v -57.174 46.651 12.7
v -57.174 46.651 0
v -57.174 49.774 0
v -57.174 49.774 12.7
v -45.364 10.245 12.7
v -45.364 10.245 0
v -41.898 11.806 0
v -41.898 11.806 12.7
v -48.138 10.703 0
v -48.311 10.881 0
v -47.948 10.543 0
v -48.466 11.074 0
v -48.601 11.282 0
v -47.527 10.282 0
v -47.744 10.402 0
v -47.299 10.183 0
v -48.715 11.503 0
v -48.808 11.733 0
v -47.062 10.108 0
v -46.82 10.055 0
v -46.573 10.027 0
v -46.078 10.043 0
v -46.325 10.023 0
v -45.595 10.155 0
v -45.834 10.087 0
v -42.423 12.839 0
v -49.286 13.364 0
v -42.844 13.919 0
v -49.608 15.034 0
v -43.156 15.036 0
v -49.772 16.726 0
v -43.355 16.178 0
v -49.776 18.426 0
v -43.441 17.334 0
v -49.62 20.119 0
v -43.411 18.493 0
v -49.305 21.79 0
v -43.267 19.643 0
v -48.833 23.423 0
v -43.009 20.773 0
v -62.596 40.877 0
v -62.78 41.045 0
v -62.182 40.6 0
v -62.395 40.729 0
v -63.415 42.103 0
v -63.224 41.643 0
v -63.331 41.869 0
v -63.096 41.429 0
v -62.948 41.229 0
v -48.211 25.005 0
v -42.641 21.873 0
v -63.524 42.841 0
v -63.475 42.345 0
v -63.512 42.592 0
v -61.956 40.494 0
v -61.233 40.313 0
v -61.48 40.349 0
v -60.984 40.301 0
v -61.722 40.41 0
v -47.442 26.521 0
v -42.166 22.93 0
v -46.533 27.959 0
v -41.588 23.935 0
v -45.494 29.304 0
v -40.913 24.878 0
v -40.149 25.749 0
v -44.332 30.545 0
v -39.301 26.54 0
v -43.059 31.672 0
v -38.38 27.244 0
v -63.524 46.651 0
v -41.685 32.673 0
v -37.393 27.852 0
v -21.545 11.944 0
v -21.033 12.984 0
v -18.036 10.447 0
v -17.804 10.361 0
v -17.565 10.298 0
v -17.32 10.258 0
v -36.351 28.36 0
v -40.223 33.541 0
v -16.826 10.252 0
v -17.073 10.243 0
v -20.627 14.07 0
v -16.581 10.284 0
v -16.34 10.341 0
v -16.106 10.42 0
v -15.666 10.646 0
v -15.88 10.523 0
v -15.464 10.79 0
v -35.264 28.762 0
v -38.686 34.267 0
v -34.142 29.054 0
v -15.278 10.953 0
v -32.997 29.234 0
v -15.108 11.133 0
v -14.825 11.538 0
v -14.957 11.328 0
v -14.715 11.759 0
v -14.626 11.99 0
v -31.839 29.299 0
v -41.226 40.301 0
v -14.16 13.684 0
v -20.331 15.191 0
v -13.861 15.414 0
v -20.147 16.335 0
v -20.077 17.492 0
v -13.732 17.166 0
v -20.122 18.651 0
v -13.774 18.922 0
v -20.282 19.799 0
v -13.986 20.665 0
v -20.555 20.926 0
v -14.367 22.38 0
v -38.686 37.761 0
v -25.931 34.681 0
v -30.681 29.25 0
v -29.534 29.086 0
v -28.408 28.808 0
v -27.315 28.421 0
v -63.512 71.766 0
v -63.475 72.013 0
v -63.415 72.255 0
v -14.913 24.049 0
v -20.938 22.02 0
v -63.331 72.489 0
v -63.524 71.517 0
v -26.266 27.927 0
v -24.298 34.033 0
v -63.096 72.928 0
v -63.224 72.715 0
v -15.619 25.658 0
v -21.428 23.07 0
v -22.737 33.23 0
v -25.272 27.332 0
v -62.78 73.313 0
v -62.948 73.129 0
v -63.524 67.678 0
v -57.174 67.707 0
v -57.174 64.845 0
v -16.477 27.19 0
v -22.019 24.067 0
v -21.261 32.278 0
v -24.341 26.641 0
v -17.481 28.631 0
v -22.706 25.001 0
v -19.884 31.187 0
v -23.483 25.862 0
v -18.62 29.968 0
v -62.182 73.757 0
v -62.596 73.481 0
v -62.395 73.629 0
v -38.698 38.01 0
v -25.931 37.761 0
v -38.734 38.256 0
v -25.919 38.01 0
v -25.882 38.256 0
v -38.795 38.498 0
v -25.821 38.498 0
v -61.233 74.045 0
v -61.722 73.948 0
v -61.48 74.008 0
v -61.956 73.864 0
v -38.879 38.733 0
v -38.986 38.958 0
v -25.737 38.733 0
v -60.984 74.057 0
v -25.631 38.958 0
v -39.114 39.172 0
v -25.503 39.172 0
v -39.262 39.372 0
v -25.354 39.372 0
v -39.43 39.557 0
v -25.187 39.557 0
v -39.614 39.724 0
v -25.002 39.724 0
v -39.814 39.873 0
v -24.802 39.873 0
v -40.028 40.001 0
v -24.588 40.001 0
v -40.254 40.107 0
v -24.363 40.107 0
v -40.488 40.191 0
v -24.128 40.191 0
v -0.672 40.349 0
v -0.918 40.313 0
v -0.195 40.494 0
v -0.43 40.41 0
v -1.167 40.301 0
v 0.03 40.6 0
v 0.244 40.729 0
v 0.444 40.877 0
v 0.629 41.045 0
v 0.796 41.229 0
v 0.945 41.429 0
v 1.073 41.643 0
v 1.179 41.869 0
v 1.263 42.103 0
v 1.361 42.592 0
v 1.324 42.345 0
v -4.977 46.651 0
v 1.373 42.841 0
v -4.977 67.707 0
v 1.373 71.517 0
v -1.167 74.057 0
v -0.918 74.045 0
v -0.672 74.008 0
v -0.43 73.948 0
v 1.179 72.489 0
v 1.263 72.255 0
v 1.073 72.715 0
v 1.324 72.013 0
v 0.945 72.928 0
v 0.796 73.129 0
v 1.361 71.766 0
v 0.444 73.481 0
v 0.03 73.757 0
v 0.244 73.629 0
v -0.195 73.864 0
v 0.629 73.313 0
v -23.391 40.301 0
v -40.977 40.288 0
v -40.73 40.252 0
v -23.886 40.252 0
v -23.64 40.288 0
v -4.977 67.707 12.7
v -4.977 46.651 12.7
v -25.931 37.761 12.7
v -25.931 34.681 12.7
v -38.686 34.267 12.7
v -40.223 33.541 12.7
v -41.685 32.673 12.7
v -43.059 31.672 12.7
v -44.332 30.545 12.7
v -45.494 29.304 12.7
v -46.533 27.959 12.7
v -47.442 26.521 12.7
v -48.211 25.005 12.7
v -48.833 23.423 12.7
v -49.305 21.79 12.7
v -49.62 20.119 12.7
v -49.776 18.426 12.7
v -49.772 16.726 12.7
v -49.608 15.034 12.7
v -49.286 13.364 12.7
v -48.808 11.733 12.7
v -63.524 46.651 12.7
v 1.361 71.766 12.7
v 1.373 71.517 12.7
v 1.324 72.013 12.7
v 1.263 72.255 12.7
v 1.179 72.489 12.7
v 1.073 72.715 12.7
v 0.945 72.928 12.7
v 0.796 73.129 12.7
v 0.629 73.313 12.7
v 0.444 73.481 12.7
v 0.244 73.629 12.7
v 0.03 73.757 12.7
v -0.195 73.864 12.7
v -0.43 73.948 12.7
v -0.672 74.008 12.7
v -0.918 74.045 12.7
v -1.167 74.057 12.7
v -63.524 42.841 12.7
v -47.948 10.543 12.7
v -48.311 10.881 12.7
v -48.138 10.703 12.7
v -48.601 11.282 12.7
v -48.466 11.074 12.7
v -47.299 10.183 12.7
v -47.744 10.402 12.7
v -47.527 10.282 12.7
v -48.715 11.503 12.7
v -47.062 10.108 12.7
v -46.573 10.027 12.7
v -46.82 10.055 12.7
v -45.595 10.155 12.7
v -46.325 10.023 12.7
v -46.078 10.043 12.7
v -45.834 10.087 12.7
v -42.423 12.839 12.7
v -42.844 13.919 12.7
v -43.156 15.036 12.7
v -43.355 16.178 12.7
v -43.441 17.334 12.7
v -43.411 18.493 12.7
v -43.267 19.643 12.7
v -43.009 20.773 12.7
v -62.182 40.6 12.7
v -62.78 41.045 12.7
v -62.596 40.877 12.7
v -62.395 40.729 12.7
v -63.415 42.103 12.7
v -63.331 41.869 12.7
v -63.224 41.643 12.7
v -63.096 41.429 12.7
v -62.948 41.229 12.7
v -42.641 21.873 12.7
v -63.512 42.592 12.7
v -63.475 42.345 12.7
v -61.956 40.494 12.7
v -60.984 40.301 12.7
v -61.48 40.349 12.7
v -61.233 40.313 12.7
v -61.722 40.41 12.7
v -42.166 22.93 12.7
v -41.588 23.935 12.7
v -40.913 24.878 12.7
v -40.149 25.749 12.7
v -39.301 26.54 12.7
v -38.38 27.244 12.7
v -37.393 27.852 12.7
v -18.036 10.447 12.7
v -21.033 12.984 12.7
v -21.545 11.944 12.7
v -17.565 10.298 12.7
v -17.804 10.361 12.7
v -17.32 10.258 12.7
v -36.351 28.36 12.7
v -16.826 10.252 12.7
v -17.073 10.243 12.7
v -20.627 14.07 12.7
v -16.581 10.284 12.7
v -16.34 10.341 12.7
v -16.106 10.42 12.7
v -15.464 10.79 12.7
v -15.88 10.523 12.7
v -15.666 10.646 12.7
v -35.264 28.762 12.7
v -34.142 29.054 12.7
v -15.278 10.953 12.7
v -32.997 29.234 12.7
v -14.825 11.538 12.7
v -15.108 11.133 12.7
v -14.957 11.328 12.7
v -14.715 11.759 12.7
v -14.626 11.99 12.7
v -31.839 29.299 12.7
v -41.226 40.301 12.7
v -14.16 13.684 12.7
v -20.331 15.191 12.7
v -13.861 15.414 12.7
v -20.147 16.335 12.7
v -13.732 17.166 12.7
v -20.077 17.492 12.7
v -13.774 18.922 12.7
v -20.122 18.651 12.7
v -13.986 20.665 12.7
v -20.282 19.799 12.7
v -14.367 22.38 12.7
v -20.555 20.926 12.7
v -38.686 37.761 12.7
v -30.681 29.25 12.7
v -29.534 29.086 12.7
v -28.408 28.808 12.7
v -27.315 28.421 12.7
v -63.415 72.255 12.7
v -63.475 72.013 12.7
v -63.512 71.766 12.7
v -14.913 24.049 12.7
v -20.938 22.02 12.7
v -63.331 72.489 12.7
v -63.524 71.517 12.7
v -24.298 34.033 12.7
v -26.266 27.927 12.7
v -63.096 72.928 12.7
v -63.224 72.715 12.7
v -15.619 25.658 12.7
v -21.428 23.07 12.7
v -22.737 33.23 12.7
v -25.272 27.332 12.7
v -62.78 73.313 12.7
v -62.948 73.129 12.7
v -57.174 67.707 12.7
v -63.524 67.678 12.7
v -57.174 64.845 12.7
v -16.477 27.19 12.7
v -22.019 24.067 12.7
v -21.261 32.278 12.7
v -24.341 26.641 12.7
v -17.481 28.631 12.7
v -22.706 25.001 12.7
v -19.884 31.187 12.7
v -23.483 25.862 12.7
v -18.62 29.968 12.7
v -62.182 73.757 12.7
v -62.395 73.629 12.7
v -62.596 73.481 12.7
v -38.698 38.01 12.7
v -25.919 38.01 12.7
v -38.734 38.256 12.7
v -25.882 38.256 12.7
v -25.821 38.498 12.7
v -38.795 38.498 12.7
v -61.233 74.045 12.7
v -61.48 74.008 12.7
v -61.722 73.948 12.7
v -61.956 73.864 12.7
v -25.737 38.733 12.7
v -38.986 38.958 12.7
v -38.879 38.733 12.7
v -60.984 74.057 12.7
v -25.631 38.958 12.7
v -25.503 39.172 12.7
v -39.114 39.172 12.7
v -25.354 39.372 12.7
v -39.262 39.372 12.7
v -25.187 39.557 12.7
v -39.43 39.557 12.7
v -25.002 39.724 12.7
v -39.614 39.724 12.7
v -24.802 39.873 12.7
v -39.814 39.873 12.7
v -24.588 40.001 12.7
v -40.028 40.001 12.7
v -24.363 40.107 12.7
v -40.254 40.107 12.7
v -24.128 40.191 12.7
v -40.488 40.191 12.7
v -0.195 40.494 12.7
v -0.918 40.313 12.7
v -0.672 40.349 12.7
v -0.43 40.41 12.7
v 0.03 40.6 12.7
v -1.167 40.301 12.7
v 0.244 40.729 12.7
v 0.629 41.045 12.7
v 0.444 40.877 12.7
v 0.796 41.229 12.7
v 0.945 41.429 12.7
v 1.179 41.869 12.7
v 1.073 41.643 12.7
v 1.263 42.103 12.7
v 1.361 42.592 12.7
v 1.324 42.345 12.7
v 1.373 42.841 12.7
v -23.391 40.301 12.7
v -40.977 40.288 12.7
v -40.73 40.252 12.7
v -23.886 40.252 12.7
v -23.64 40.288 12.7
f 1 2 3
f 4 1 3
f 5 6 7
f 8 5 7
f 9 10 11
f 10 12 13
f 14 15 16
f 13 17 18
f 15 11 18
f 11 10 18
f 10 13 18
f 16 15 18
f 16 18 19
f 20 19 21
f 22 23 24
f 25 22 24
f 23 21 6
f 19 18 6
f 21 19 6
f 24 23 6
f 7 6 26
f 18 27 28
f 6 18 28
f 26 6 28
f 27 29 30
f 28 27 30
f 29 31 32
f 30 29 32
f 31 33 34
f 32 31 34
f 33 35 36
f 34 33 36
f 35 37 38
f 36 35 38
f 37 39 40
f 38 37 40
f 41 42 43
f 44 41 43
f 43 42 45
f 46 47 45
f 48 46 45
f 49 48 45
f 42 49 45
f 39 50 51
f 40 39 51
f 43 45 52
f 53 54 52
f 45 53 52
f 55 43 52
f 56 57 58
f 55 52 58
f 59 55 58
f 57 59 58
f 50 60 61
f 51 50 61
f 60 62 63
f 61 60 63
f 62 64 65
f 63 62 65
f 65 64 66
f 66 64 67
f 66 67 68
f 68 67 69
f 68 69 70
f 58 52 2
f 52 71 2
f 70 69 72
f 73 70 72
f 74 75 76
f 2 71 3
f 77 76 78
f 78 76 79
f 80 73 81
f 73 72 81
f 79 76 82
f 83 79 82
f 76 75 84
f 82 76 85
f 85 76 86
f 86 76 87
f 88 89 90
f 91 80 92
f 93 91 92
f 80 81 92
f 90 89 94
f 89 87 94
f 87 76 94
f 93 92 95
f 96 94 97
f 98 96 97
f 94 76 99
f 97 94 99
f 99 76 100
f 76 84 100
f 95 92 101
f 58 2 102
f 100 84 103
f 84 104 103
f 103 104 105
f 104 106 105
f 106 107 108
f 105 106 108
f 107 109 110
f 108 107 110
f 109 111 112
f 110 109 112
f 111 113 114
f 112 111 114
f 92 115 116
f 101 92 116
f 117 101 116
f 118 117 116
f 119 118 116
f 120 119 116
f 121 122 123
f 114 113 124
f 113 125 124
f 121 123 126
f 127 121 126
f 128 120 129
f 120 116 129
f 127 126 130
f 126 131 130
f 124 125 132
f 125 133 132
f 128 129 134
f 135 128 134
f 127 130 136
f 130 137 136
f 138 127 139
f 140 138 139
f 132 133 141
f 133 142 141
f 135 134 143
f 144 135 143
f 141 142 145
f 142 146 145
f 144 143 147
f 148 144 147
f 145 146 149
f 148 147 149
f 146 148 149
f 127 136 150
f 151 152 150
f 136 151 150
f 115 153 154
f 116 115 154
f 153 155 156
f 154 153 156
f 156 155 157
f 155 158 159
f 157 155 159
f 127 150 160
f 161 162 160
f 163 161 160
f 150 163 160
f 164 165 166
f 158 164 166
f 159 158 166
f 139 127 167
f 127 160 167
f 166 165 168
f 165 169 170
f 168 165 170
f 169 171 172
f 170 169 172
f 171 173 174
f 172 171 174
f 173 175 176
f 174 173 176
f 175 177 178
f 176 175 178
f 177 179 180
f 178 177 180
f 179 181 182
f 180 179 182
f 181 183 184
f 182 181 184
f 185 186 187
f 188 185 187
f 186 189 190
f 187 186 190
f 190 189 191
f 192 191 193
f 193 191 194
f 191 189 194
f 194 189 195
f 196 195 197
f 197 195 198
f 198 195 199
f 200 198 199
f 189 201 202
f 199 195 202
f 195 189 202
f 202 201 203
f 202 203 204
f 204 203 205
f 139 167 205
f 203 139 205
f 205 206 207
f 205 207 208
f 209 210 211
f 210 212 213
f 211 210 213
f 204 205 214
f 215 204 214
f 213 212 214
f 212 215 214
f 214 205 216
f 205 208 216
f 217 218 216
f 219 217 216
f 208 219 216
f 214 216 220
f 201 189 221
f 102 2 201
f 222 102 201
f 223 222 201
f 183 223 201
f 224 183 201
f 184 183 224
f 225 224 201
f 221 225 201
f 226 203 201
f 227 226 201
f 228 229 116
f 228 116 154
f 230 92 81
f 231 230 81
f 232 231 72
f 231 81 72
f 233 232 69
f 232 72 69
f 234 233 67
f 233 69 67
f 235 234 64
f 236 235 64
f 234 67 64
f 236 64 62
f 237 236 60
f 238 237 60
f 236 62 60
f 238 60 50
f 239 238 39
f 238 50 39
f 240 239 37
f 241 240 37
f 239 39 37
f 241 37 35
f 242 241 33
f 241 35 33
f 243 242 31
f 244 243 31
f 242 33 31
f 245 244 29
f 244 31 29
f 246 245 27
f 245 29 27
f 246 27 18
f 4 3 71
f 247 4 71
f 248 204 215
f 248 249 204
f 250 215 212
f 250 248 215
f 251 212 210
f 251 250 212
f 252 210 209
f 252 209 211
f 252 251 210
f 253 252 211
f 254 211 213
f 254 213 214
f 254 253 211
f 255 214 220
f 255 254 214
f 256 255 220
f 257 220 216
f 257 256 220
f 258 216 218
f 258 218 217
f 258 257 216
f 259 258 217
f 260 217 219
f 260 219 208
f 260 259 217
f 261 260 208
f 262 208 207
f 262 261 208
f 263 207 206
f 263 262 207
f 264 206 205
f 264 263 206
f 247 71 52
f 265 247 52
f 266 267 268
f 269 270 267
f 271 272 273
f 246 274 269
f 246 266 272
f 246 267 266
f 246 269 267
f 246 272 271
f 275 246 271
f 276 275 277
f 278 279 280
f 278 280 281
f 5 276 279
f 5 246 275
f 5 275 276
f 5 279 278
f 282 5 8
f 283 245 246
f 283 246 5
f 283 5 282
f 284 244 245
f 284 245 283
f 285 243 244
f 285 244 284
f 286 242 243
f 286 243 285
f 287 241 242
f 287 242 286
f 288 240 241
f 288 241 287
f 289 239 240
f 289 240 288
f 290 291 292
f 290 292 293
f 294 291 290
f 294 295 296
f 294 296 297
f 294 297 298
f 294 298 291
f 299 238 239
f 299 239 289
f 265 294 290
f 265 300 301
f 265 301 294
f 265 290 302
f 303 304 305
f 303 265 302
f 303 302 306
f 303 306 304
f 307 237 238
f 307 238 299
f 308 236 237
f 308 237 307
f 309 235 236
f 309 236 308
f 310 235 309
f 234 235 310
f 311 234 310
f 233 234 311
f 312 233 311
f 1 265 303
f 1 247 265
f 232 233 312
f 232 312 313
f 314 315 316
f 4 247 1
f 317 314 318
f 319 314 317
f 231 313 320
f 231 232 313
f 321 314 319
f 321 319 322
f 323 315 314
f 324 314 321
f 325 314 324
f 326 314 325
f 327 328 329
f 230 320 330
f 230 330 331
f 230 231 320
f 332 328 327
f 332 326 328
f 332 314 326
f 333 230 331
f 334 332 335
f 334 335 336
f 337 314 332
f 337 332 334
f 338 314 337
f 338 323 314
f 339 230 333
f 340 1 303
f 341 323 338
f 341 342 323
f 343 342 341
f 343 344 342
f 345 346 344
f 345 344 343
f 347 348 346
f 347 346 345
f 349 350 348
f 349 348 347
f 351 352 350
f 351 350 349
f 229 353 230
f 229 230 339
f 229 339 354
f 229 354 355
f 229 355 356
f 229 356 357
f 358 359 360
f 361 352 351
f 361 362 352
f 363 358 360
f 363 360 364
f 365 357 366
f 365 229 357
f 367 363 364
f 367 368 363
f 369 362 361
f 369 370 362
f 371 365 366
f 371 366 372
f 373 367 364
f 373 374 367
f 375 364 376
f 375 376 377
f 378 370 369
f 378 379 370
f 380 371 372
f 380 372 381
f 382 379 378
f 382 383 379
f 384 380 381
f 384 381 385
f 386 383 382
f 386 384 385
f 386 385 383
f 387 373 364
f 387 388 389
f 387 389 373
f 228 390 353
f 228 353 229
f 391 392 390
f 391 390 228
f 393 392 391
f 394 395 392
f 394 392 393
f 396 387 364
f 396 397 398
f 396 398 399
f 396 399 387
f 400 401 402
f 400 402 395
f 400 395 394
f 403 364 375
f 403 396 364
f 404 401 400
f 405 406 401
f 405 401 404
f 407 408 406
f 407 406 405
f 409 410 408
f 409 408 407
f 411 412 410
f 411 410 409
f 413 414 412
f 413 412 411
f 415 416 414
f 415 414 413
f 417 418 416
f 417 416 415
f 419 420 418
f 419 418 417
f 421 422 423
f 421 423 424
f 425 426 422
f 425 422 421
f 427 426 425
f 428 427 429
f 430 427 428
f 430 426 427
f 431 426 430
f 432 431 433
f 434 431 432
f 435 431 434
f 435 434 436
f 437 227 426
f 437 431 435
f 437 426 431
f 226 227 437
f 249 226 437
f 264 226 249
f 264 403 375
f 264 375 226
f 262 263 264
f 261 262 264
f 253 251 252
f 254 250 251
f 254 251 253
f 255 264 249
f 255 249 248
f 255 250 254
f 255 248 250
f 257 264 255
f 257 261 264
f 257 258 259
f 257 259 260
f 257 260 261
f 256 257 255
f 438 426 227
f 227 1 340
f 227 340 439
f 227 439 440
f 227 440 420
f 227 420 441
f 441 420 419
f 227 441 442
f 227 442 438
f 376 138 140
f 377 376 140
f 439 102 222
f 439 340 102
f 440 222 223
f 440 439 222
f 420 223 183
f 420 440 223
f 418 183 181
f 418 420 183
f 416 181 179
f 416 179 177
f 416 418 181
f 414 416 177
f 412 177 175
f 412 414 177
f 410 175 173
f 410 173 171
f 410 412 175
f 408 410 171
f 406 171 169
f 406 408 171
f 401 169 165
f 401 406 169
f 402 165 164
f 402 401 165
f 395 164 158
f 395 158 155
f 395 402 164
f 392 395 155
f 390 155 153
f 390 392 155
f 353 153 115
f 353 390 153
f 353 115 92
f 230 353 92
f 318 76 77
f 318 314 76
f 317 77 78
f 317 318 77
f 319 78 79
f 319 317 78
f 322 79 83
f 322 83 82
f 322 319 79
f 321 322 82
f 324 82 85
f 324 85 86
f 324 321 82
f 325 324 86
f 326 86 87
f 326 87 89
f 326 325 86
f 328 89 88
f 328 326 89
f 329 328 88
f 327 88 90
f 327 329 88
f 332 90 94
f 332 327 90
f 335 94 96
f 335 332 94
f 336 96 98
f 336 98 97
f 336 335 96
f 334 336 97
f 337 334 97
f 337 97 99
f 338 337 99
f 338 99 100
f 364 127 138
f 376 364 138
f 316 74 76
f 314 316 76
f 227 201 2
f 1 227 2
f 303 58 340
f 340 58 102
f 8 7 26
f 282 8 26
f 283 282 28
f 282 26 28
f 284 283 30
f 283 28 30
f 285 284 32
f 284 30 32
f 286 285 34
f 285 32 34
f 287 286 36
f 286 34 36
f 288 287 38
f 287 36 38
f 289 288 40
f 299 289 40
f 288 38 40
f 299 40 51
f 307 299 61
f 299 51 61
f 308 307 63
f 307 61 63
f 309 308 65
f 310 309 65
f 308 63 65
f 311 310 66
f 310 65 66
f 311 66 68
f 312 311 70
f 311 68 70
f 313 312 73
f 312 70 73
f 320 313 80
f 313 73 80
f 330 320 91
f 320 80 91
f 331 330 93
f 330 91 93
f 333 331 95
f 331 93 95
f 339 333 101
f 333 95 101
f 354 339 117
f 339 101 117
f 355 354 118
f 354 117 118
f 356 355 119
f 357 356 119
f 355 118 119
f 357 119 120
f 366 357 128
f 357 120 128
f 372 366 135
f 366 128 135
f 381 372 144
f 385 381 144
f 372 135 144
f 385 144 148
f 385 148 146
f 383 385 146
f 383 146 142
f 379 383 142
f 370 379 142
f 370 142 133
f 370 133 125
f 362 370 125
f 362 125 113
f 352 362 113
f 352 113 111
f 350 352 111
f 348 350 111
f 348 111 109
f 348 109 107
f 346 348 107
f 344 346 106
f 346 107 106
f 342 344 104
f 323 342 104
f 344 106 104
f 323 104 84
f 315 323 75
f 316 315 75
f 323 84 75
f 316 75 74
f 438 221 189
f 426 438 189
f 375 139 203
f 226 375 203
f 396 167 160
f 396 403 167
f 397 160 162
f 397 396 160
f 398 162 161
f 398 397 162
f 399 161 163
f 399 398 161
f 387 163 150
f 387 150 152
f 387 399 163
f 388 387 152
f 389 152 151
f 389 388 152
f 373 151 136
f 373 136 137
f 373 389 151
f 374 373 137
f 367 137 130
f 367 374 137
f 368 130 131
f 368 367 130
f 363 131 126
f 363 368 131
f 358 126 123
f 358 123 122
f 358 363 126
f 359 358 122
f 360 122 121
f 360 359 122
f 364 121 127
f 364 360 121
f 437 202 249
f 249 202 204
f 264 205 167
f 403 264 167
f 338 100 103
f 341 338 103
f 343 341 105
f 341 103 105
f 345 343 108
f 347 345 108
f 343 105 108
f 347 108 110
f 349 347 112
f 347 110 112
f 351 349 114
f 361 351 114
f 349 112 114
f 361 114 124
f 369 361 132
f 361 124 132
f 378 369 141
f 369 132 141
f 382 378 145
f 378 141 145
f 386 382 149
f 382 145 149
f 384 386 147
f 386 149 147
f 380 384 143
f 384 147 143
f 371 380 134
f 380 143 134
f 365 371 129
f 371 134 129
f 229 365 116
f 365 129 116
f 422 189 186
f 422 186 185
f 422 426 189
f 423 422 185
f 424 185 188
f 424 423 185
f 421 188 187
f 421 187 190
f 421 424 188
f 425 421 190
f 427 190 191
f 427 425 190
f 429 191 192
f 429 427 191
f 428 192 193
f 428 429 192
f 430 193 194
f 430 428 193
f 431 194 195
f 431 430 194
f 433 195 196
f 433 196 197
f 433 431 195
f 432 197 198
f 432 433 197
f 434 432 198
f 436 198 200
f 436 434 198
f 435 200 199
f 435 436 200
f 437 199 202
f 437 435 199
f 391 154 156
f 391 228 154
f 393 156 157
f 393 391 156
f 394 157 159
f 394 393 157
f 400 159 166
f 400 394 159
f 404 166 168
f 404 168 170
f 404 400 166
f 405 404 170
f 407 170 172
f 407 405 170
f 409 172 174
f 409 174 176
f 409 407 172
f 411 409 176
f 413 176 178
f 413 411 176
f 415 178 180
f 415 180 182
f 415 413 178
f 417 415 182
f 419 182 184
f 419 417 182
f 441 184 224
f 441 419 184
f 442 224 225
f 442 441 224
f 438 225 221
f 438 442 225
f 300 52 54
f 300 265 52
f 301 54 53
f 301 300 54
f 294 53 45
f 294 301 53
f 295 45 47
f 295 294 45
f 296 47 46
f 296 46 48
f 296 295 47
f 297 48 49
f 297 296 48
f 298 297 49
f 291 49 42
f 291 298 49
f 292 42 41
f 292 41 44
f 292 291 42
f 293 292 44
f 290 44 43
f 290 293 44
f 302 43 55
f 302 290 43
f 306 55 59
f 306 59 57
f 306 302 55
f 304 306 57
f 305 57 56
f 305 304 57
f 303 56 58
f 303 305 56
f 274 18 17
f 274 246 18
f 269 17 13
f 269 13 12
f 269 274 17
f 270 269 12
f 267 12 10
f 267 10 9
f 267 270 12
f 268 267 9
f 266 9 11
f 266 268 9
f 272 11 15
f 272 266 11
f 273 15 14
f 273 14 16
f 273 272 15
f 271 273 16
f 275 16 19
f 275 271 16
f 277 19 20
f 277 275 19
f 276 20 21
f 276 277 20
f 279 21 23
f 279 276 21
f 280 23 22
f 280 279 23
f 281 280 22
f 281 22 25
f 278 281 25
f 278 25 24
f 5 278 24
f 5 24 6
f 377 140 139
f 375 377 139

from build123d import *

# Parameters (mm, degrees)
F1_DEPTH = 12.7
F2_R     = 2.54
F3_R     = 2.54


with BuildPart() as f1:
    # F0 (on Top) → F1 (new body)
    with BuildSketch(Plane.XY):
        with BuildLine():
            Line((-4.977204, 46.650577), (-57.174204, 46.650577))
            Line((-57.174204, 46.650577), (-57.174204, 49.774006))
            Line((-57.174204, 49.774006), (-63.524204, 46.650577))
            Line((-63.524204, 46.650577), (-63.524204, 40.300577))
            Line((-63.524204, 40.300577), (-38.685617, 40.300577))
            Line((-38.685617, 40.300577), (-38.685617, 34.266871))
            ThreePointArc((-38.685617, 34.266871), (-48.729742, 23.719707), (-47.705534, 9.19118))
            Line((-47.705534, 9.19118), (-41.897547, 11.806156))
            ThreePointArc((-41.897547, 11.806156), (-31.839298, 29.299365), (-21.54512, 11.943945))
            Line((-21.54512, 11.943945), (-15.684392, 9.442896))
            ThreePointArc((-15.684392, 9.442896), (-15.050737, 24.39937), (-25.9308, 34.681484))
            Line((-25.9308, 34.681484), (-25.9308, 40.300577))
            Line((-25.9308, 40.300577), (1.372796, 40.300577))
            Line((1.372796, 40.300577), (1.372796, 74.057181))
            Line((1.372796, 74.057181), (-63.524204, 74.057181))
            Line((-63.524204, 74.057181), (-63.524204, 67.677669))
            Line((-63.524204, 67.677669), (-57.174204, 64.84545))
            Line((-57.174204, 64.84545), (-57.174204, 67.707181))
            Line((-57.174204, 67.707181), (-4.977204, 67.707181))
            Line((-4.977204, 67.707181), (-4.977204, 46.650577))
        make_face()
    extrude(amount=F1_DEPTH)

    # F2
    f2_edges = [f1.edges().sort_by_distance(p)[0] for p in [
        (-63.524204, 74.057181, 6.35),
        (-63.524204, 40.300577, 6.35),
        (-38.685617, 40.300577, 6.35),
        (-25.9308, 40.300577, 6.35),
        (1.372796, 40.300577, 6.35),
        (1.372796, 74.057181, 6.35),
    ]]
    fillet(f2_edges, radius=F2_R)

    # F3
    f3_edges = [f1.edges().sort_by_distance(p)[0] for p in [
        (-15.684392, 9.442896, 6.35),
        (-47.705534, 9.19118, 6.35),
    ]]
    fillet(f3_edges, radius=F3_R)


solid = f1.part
